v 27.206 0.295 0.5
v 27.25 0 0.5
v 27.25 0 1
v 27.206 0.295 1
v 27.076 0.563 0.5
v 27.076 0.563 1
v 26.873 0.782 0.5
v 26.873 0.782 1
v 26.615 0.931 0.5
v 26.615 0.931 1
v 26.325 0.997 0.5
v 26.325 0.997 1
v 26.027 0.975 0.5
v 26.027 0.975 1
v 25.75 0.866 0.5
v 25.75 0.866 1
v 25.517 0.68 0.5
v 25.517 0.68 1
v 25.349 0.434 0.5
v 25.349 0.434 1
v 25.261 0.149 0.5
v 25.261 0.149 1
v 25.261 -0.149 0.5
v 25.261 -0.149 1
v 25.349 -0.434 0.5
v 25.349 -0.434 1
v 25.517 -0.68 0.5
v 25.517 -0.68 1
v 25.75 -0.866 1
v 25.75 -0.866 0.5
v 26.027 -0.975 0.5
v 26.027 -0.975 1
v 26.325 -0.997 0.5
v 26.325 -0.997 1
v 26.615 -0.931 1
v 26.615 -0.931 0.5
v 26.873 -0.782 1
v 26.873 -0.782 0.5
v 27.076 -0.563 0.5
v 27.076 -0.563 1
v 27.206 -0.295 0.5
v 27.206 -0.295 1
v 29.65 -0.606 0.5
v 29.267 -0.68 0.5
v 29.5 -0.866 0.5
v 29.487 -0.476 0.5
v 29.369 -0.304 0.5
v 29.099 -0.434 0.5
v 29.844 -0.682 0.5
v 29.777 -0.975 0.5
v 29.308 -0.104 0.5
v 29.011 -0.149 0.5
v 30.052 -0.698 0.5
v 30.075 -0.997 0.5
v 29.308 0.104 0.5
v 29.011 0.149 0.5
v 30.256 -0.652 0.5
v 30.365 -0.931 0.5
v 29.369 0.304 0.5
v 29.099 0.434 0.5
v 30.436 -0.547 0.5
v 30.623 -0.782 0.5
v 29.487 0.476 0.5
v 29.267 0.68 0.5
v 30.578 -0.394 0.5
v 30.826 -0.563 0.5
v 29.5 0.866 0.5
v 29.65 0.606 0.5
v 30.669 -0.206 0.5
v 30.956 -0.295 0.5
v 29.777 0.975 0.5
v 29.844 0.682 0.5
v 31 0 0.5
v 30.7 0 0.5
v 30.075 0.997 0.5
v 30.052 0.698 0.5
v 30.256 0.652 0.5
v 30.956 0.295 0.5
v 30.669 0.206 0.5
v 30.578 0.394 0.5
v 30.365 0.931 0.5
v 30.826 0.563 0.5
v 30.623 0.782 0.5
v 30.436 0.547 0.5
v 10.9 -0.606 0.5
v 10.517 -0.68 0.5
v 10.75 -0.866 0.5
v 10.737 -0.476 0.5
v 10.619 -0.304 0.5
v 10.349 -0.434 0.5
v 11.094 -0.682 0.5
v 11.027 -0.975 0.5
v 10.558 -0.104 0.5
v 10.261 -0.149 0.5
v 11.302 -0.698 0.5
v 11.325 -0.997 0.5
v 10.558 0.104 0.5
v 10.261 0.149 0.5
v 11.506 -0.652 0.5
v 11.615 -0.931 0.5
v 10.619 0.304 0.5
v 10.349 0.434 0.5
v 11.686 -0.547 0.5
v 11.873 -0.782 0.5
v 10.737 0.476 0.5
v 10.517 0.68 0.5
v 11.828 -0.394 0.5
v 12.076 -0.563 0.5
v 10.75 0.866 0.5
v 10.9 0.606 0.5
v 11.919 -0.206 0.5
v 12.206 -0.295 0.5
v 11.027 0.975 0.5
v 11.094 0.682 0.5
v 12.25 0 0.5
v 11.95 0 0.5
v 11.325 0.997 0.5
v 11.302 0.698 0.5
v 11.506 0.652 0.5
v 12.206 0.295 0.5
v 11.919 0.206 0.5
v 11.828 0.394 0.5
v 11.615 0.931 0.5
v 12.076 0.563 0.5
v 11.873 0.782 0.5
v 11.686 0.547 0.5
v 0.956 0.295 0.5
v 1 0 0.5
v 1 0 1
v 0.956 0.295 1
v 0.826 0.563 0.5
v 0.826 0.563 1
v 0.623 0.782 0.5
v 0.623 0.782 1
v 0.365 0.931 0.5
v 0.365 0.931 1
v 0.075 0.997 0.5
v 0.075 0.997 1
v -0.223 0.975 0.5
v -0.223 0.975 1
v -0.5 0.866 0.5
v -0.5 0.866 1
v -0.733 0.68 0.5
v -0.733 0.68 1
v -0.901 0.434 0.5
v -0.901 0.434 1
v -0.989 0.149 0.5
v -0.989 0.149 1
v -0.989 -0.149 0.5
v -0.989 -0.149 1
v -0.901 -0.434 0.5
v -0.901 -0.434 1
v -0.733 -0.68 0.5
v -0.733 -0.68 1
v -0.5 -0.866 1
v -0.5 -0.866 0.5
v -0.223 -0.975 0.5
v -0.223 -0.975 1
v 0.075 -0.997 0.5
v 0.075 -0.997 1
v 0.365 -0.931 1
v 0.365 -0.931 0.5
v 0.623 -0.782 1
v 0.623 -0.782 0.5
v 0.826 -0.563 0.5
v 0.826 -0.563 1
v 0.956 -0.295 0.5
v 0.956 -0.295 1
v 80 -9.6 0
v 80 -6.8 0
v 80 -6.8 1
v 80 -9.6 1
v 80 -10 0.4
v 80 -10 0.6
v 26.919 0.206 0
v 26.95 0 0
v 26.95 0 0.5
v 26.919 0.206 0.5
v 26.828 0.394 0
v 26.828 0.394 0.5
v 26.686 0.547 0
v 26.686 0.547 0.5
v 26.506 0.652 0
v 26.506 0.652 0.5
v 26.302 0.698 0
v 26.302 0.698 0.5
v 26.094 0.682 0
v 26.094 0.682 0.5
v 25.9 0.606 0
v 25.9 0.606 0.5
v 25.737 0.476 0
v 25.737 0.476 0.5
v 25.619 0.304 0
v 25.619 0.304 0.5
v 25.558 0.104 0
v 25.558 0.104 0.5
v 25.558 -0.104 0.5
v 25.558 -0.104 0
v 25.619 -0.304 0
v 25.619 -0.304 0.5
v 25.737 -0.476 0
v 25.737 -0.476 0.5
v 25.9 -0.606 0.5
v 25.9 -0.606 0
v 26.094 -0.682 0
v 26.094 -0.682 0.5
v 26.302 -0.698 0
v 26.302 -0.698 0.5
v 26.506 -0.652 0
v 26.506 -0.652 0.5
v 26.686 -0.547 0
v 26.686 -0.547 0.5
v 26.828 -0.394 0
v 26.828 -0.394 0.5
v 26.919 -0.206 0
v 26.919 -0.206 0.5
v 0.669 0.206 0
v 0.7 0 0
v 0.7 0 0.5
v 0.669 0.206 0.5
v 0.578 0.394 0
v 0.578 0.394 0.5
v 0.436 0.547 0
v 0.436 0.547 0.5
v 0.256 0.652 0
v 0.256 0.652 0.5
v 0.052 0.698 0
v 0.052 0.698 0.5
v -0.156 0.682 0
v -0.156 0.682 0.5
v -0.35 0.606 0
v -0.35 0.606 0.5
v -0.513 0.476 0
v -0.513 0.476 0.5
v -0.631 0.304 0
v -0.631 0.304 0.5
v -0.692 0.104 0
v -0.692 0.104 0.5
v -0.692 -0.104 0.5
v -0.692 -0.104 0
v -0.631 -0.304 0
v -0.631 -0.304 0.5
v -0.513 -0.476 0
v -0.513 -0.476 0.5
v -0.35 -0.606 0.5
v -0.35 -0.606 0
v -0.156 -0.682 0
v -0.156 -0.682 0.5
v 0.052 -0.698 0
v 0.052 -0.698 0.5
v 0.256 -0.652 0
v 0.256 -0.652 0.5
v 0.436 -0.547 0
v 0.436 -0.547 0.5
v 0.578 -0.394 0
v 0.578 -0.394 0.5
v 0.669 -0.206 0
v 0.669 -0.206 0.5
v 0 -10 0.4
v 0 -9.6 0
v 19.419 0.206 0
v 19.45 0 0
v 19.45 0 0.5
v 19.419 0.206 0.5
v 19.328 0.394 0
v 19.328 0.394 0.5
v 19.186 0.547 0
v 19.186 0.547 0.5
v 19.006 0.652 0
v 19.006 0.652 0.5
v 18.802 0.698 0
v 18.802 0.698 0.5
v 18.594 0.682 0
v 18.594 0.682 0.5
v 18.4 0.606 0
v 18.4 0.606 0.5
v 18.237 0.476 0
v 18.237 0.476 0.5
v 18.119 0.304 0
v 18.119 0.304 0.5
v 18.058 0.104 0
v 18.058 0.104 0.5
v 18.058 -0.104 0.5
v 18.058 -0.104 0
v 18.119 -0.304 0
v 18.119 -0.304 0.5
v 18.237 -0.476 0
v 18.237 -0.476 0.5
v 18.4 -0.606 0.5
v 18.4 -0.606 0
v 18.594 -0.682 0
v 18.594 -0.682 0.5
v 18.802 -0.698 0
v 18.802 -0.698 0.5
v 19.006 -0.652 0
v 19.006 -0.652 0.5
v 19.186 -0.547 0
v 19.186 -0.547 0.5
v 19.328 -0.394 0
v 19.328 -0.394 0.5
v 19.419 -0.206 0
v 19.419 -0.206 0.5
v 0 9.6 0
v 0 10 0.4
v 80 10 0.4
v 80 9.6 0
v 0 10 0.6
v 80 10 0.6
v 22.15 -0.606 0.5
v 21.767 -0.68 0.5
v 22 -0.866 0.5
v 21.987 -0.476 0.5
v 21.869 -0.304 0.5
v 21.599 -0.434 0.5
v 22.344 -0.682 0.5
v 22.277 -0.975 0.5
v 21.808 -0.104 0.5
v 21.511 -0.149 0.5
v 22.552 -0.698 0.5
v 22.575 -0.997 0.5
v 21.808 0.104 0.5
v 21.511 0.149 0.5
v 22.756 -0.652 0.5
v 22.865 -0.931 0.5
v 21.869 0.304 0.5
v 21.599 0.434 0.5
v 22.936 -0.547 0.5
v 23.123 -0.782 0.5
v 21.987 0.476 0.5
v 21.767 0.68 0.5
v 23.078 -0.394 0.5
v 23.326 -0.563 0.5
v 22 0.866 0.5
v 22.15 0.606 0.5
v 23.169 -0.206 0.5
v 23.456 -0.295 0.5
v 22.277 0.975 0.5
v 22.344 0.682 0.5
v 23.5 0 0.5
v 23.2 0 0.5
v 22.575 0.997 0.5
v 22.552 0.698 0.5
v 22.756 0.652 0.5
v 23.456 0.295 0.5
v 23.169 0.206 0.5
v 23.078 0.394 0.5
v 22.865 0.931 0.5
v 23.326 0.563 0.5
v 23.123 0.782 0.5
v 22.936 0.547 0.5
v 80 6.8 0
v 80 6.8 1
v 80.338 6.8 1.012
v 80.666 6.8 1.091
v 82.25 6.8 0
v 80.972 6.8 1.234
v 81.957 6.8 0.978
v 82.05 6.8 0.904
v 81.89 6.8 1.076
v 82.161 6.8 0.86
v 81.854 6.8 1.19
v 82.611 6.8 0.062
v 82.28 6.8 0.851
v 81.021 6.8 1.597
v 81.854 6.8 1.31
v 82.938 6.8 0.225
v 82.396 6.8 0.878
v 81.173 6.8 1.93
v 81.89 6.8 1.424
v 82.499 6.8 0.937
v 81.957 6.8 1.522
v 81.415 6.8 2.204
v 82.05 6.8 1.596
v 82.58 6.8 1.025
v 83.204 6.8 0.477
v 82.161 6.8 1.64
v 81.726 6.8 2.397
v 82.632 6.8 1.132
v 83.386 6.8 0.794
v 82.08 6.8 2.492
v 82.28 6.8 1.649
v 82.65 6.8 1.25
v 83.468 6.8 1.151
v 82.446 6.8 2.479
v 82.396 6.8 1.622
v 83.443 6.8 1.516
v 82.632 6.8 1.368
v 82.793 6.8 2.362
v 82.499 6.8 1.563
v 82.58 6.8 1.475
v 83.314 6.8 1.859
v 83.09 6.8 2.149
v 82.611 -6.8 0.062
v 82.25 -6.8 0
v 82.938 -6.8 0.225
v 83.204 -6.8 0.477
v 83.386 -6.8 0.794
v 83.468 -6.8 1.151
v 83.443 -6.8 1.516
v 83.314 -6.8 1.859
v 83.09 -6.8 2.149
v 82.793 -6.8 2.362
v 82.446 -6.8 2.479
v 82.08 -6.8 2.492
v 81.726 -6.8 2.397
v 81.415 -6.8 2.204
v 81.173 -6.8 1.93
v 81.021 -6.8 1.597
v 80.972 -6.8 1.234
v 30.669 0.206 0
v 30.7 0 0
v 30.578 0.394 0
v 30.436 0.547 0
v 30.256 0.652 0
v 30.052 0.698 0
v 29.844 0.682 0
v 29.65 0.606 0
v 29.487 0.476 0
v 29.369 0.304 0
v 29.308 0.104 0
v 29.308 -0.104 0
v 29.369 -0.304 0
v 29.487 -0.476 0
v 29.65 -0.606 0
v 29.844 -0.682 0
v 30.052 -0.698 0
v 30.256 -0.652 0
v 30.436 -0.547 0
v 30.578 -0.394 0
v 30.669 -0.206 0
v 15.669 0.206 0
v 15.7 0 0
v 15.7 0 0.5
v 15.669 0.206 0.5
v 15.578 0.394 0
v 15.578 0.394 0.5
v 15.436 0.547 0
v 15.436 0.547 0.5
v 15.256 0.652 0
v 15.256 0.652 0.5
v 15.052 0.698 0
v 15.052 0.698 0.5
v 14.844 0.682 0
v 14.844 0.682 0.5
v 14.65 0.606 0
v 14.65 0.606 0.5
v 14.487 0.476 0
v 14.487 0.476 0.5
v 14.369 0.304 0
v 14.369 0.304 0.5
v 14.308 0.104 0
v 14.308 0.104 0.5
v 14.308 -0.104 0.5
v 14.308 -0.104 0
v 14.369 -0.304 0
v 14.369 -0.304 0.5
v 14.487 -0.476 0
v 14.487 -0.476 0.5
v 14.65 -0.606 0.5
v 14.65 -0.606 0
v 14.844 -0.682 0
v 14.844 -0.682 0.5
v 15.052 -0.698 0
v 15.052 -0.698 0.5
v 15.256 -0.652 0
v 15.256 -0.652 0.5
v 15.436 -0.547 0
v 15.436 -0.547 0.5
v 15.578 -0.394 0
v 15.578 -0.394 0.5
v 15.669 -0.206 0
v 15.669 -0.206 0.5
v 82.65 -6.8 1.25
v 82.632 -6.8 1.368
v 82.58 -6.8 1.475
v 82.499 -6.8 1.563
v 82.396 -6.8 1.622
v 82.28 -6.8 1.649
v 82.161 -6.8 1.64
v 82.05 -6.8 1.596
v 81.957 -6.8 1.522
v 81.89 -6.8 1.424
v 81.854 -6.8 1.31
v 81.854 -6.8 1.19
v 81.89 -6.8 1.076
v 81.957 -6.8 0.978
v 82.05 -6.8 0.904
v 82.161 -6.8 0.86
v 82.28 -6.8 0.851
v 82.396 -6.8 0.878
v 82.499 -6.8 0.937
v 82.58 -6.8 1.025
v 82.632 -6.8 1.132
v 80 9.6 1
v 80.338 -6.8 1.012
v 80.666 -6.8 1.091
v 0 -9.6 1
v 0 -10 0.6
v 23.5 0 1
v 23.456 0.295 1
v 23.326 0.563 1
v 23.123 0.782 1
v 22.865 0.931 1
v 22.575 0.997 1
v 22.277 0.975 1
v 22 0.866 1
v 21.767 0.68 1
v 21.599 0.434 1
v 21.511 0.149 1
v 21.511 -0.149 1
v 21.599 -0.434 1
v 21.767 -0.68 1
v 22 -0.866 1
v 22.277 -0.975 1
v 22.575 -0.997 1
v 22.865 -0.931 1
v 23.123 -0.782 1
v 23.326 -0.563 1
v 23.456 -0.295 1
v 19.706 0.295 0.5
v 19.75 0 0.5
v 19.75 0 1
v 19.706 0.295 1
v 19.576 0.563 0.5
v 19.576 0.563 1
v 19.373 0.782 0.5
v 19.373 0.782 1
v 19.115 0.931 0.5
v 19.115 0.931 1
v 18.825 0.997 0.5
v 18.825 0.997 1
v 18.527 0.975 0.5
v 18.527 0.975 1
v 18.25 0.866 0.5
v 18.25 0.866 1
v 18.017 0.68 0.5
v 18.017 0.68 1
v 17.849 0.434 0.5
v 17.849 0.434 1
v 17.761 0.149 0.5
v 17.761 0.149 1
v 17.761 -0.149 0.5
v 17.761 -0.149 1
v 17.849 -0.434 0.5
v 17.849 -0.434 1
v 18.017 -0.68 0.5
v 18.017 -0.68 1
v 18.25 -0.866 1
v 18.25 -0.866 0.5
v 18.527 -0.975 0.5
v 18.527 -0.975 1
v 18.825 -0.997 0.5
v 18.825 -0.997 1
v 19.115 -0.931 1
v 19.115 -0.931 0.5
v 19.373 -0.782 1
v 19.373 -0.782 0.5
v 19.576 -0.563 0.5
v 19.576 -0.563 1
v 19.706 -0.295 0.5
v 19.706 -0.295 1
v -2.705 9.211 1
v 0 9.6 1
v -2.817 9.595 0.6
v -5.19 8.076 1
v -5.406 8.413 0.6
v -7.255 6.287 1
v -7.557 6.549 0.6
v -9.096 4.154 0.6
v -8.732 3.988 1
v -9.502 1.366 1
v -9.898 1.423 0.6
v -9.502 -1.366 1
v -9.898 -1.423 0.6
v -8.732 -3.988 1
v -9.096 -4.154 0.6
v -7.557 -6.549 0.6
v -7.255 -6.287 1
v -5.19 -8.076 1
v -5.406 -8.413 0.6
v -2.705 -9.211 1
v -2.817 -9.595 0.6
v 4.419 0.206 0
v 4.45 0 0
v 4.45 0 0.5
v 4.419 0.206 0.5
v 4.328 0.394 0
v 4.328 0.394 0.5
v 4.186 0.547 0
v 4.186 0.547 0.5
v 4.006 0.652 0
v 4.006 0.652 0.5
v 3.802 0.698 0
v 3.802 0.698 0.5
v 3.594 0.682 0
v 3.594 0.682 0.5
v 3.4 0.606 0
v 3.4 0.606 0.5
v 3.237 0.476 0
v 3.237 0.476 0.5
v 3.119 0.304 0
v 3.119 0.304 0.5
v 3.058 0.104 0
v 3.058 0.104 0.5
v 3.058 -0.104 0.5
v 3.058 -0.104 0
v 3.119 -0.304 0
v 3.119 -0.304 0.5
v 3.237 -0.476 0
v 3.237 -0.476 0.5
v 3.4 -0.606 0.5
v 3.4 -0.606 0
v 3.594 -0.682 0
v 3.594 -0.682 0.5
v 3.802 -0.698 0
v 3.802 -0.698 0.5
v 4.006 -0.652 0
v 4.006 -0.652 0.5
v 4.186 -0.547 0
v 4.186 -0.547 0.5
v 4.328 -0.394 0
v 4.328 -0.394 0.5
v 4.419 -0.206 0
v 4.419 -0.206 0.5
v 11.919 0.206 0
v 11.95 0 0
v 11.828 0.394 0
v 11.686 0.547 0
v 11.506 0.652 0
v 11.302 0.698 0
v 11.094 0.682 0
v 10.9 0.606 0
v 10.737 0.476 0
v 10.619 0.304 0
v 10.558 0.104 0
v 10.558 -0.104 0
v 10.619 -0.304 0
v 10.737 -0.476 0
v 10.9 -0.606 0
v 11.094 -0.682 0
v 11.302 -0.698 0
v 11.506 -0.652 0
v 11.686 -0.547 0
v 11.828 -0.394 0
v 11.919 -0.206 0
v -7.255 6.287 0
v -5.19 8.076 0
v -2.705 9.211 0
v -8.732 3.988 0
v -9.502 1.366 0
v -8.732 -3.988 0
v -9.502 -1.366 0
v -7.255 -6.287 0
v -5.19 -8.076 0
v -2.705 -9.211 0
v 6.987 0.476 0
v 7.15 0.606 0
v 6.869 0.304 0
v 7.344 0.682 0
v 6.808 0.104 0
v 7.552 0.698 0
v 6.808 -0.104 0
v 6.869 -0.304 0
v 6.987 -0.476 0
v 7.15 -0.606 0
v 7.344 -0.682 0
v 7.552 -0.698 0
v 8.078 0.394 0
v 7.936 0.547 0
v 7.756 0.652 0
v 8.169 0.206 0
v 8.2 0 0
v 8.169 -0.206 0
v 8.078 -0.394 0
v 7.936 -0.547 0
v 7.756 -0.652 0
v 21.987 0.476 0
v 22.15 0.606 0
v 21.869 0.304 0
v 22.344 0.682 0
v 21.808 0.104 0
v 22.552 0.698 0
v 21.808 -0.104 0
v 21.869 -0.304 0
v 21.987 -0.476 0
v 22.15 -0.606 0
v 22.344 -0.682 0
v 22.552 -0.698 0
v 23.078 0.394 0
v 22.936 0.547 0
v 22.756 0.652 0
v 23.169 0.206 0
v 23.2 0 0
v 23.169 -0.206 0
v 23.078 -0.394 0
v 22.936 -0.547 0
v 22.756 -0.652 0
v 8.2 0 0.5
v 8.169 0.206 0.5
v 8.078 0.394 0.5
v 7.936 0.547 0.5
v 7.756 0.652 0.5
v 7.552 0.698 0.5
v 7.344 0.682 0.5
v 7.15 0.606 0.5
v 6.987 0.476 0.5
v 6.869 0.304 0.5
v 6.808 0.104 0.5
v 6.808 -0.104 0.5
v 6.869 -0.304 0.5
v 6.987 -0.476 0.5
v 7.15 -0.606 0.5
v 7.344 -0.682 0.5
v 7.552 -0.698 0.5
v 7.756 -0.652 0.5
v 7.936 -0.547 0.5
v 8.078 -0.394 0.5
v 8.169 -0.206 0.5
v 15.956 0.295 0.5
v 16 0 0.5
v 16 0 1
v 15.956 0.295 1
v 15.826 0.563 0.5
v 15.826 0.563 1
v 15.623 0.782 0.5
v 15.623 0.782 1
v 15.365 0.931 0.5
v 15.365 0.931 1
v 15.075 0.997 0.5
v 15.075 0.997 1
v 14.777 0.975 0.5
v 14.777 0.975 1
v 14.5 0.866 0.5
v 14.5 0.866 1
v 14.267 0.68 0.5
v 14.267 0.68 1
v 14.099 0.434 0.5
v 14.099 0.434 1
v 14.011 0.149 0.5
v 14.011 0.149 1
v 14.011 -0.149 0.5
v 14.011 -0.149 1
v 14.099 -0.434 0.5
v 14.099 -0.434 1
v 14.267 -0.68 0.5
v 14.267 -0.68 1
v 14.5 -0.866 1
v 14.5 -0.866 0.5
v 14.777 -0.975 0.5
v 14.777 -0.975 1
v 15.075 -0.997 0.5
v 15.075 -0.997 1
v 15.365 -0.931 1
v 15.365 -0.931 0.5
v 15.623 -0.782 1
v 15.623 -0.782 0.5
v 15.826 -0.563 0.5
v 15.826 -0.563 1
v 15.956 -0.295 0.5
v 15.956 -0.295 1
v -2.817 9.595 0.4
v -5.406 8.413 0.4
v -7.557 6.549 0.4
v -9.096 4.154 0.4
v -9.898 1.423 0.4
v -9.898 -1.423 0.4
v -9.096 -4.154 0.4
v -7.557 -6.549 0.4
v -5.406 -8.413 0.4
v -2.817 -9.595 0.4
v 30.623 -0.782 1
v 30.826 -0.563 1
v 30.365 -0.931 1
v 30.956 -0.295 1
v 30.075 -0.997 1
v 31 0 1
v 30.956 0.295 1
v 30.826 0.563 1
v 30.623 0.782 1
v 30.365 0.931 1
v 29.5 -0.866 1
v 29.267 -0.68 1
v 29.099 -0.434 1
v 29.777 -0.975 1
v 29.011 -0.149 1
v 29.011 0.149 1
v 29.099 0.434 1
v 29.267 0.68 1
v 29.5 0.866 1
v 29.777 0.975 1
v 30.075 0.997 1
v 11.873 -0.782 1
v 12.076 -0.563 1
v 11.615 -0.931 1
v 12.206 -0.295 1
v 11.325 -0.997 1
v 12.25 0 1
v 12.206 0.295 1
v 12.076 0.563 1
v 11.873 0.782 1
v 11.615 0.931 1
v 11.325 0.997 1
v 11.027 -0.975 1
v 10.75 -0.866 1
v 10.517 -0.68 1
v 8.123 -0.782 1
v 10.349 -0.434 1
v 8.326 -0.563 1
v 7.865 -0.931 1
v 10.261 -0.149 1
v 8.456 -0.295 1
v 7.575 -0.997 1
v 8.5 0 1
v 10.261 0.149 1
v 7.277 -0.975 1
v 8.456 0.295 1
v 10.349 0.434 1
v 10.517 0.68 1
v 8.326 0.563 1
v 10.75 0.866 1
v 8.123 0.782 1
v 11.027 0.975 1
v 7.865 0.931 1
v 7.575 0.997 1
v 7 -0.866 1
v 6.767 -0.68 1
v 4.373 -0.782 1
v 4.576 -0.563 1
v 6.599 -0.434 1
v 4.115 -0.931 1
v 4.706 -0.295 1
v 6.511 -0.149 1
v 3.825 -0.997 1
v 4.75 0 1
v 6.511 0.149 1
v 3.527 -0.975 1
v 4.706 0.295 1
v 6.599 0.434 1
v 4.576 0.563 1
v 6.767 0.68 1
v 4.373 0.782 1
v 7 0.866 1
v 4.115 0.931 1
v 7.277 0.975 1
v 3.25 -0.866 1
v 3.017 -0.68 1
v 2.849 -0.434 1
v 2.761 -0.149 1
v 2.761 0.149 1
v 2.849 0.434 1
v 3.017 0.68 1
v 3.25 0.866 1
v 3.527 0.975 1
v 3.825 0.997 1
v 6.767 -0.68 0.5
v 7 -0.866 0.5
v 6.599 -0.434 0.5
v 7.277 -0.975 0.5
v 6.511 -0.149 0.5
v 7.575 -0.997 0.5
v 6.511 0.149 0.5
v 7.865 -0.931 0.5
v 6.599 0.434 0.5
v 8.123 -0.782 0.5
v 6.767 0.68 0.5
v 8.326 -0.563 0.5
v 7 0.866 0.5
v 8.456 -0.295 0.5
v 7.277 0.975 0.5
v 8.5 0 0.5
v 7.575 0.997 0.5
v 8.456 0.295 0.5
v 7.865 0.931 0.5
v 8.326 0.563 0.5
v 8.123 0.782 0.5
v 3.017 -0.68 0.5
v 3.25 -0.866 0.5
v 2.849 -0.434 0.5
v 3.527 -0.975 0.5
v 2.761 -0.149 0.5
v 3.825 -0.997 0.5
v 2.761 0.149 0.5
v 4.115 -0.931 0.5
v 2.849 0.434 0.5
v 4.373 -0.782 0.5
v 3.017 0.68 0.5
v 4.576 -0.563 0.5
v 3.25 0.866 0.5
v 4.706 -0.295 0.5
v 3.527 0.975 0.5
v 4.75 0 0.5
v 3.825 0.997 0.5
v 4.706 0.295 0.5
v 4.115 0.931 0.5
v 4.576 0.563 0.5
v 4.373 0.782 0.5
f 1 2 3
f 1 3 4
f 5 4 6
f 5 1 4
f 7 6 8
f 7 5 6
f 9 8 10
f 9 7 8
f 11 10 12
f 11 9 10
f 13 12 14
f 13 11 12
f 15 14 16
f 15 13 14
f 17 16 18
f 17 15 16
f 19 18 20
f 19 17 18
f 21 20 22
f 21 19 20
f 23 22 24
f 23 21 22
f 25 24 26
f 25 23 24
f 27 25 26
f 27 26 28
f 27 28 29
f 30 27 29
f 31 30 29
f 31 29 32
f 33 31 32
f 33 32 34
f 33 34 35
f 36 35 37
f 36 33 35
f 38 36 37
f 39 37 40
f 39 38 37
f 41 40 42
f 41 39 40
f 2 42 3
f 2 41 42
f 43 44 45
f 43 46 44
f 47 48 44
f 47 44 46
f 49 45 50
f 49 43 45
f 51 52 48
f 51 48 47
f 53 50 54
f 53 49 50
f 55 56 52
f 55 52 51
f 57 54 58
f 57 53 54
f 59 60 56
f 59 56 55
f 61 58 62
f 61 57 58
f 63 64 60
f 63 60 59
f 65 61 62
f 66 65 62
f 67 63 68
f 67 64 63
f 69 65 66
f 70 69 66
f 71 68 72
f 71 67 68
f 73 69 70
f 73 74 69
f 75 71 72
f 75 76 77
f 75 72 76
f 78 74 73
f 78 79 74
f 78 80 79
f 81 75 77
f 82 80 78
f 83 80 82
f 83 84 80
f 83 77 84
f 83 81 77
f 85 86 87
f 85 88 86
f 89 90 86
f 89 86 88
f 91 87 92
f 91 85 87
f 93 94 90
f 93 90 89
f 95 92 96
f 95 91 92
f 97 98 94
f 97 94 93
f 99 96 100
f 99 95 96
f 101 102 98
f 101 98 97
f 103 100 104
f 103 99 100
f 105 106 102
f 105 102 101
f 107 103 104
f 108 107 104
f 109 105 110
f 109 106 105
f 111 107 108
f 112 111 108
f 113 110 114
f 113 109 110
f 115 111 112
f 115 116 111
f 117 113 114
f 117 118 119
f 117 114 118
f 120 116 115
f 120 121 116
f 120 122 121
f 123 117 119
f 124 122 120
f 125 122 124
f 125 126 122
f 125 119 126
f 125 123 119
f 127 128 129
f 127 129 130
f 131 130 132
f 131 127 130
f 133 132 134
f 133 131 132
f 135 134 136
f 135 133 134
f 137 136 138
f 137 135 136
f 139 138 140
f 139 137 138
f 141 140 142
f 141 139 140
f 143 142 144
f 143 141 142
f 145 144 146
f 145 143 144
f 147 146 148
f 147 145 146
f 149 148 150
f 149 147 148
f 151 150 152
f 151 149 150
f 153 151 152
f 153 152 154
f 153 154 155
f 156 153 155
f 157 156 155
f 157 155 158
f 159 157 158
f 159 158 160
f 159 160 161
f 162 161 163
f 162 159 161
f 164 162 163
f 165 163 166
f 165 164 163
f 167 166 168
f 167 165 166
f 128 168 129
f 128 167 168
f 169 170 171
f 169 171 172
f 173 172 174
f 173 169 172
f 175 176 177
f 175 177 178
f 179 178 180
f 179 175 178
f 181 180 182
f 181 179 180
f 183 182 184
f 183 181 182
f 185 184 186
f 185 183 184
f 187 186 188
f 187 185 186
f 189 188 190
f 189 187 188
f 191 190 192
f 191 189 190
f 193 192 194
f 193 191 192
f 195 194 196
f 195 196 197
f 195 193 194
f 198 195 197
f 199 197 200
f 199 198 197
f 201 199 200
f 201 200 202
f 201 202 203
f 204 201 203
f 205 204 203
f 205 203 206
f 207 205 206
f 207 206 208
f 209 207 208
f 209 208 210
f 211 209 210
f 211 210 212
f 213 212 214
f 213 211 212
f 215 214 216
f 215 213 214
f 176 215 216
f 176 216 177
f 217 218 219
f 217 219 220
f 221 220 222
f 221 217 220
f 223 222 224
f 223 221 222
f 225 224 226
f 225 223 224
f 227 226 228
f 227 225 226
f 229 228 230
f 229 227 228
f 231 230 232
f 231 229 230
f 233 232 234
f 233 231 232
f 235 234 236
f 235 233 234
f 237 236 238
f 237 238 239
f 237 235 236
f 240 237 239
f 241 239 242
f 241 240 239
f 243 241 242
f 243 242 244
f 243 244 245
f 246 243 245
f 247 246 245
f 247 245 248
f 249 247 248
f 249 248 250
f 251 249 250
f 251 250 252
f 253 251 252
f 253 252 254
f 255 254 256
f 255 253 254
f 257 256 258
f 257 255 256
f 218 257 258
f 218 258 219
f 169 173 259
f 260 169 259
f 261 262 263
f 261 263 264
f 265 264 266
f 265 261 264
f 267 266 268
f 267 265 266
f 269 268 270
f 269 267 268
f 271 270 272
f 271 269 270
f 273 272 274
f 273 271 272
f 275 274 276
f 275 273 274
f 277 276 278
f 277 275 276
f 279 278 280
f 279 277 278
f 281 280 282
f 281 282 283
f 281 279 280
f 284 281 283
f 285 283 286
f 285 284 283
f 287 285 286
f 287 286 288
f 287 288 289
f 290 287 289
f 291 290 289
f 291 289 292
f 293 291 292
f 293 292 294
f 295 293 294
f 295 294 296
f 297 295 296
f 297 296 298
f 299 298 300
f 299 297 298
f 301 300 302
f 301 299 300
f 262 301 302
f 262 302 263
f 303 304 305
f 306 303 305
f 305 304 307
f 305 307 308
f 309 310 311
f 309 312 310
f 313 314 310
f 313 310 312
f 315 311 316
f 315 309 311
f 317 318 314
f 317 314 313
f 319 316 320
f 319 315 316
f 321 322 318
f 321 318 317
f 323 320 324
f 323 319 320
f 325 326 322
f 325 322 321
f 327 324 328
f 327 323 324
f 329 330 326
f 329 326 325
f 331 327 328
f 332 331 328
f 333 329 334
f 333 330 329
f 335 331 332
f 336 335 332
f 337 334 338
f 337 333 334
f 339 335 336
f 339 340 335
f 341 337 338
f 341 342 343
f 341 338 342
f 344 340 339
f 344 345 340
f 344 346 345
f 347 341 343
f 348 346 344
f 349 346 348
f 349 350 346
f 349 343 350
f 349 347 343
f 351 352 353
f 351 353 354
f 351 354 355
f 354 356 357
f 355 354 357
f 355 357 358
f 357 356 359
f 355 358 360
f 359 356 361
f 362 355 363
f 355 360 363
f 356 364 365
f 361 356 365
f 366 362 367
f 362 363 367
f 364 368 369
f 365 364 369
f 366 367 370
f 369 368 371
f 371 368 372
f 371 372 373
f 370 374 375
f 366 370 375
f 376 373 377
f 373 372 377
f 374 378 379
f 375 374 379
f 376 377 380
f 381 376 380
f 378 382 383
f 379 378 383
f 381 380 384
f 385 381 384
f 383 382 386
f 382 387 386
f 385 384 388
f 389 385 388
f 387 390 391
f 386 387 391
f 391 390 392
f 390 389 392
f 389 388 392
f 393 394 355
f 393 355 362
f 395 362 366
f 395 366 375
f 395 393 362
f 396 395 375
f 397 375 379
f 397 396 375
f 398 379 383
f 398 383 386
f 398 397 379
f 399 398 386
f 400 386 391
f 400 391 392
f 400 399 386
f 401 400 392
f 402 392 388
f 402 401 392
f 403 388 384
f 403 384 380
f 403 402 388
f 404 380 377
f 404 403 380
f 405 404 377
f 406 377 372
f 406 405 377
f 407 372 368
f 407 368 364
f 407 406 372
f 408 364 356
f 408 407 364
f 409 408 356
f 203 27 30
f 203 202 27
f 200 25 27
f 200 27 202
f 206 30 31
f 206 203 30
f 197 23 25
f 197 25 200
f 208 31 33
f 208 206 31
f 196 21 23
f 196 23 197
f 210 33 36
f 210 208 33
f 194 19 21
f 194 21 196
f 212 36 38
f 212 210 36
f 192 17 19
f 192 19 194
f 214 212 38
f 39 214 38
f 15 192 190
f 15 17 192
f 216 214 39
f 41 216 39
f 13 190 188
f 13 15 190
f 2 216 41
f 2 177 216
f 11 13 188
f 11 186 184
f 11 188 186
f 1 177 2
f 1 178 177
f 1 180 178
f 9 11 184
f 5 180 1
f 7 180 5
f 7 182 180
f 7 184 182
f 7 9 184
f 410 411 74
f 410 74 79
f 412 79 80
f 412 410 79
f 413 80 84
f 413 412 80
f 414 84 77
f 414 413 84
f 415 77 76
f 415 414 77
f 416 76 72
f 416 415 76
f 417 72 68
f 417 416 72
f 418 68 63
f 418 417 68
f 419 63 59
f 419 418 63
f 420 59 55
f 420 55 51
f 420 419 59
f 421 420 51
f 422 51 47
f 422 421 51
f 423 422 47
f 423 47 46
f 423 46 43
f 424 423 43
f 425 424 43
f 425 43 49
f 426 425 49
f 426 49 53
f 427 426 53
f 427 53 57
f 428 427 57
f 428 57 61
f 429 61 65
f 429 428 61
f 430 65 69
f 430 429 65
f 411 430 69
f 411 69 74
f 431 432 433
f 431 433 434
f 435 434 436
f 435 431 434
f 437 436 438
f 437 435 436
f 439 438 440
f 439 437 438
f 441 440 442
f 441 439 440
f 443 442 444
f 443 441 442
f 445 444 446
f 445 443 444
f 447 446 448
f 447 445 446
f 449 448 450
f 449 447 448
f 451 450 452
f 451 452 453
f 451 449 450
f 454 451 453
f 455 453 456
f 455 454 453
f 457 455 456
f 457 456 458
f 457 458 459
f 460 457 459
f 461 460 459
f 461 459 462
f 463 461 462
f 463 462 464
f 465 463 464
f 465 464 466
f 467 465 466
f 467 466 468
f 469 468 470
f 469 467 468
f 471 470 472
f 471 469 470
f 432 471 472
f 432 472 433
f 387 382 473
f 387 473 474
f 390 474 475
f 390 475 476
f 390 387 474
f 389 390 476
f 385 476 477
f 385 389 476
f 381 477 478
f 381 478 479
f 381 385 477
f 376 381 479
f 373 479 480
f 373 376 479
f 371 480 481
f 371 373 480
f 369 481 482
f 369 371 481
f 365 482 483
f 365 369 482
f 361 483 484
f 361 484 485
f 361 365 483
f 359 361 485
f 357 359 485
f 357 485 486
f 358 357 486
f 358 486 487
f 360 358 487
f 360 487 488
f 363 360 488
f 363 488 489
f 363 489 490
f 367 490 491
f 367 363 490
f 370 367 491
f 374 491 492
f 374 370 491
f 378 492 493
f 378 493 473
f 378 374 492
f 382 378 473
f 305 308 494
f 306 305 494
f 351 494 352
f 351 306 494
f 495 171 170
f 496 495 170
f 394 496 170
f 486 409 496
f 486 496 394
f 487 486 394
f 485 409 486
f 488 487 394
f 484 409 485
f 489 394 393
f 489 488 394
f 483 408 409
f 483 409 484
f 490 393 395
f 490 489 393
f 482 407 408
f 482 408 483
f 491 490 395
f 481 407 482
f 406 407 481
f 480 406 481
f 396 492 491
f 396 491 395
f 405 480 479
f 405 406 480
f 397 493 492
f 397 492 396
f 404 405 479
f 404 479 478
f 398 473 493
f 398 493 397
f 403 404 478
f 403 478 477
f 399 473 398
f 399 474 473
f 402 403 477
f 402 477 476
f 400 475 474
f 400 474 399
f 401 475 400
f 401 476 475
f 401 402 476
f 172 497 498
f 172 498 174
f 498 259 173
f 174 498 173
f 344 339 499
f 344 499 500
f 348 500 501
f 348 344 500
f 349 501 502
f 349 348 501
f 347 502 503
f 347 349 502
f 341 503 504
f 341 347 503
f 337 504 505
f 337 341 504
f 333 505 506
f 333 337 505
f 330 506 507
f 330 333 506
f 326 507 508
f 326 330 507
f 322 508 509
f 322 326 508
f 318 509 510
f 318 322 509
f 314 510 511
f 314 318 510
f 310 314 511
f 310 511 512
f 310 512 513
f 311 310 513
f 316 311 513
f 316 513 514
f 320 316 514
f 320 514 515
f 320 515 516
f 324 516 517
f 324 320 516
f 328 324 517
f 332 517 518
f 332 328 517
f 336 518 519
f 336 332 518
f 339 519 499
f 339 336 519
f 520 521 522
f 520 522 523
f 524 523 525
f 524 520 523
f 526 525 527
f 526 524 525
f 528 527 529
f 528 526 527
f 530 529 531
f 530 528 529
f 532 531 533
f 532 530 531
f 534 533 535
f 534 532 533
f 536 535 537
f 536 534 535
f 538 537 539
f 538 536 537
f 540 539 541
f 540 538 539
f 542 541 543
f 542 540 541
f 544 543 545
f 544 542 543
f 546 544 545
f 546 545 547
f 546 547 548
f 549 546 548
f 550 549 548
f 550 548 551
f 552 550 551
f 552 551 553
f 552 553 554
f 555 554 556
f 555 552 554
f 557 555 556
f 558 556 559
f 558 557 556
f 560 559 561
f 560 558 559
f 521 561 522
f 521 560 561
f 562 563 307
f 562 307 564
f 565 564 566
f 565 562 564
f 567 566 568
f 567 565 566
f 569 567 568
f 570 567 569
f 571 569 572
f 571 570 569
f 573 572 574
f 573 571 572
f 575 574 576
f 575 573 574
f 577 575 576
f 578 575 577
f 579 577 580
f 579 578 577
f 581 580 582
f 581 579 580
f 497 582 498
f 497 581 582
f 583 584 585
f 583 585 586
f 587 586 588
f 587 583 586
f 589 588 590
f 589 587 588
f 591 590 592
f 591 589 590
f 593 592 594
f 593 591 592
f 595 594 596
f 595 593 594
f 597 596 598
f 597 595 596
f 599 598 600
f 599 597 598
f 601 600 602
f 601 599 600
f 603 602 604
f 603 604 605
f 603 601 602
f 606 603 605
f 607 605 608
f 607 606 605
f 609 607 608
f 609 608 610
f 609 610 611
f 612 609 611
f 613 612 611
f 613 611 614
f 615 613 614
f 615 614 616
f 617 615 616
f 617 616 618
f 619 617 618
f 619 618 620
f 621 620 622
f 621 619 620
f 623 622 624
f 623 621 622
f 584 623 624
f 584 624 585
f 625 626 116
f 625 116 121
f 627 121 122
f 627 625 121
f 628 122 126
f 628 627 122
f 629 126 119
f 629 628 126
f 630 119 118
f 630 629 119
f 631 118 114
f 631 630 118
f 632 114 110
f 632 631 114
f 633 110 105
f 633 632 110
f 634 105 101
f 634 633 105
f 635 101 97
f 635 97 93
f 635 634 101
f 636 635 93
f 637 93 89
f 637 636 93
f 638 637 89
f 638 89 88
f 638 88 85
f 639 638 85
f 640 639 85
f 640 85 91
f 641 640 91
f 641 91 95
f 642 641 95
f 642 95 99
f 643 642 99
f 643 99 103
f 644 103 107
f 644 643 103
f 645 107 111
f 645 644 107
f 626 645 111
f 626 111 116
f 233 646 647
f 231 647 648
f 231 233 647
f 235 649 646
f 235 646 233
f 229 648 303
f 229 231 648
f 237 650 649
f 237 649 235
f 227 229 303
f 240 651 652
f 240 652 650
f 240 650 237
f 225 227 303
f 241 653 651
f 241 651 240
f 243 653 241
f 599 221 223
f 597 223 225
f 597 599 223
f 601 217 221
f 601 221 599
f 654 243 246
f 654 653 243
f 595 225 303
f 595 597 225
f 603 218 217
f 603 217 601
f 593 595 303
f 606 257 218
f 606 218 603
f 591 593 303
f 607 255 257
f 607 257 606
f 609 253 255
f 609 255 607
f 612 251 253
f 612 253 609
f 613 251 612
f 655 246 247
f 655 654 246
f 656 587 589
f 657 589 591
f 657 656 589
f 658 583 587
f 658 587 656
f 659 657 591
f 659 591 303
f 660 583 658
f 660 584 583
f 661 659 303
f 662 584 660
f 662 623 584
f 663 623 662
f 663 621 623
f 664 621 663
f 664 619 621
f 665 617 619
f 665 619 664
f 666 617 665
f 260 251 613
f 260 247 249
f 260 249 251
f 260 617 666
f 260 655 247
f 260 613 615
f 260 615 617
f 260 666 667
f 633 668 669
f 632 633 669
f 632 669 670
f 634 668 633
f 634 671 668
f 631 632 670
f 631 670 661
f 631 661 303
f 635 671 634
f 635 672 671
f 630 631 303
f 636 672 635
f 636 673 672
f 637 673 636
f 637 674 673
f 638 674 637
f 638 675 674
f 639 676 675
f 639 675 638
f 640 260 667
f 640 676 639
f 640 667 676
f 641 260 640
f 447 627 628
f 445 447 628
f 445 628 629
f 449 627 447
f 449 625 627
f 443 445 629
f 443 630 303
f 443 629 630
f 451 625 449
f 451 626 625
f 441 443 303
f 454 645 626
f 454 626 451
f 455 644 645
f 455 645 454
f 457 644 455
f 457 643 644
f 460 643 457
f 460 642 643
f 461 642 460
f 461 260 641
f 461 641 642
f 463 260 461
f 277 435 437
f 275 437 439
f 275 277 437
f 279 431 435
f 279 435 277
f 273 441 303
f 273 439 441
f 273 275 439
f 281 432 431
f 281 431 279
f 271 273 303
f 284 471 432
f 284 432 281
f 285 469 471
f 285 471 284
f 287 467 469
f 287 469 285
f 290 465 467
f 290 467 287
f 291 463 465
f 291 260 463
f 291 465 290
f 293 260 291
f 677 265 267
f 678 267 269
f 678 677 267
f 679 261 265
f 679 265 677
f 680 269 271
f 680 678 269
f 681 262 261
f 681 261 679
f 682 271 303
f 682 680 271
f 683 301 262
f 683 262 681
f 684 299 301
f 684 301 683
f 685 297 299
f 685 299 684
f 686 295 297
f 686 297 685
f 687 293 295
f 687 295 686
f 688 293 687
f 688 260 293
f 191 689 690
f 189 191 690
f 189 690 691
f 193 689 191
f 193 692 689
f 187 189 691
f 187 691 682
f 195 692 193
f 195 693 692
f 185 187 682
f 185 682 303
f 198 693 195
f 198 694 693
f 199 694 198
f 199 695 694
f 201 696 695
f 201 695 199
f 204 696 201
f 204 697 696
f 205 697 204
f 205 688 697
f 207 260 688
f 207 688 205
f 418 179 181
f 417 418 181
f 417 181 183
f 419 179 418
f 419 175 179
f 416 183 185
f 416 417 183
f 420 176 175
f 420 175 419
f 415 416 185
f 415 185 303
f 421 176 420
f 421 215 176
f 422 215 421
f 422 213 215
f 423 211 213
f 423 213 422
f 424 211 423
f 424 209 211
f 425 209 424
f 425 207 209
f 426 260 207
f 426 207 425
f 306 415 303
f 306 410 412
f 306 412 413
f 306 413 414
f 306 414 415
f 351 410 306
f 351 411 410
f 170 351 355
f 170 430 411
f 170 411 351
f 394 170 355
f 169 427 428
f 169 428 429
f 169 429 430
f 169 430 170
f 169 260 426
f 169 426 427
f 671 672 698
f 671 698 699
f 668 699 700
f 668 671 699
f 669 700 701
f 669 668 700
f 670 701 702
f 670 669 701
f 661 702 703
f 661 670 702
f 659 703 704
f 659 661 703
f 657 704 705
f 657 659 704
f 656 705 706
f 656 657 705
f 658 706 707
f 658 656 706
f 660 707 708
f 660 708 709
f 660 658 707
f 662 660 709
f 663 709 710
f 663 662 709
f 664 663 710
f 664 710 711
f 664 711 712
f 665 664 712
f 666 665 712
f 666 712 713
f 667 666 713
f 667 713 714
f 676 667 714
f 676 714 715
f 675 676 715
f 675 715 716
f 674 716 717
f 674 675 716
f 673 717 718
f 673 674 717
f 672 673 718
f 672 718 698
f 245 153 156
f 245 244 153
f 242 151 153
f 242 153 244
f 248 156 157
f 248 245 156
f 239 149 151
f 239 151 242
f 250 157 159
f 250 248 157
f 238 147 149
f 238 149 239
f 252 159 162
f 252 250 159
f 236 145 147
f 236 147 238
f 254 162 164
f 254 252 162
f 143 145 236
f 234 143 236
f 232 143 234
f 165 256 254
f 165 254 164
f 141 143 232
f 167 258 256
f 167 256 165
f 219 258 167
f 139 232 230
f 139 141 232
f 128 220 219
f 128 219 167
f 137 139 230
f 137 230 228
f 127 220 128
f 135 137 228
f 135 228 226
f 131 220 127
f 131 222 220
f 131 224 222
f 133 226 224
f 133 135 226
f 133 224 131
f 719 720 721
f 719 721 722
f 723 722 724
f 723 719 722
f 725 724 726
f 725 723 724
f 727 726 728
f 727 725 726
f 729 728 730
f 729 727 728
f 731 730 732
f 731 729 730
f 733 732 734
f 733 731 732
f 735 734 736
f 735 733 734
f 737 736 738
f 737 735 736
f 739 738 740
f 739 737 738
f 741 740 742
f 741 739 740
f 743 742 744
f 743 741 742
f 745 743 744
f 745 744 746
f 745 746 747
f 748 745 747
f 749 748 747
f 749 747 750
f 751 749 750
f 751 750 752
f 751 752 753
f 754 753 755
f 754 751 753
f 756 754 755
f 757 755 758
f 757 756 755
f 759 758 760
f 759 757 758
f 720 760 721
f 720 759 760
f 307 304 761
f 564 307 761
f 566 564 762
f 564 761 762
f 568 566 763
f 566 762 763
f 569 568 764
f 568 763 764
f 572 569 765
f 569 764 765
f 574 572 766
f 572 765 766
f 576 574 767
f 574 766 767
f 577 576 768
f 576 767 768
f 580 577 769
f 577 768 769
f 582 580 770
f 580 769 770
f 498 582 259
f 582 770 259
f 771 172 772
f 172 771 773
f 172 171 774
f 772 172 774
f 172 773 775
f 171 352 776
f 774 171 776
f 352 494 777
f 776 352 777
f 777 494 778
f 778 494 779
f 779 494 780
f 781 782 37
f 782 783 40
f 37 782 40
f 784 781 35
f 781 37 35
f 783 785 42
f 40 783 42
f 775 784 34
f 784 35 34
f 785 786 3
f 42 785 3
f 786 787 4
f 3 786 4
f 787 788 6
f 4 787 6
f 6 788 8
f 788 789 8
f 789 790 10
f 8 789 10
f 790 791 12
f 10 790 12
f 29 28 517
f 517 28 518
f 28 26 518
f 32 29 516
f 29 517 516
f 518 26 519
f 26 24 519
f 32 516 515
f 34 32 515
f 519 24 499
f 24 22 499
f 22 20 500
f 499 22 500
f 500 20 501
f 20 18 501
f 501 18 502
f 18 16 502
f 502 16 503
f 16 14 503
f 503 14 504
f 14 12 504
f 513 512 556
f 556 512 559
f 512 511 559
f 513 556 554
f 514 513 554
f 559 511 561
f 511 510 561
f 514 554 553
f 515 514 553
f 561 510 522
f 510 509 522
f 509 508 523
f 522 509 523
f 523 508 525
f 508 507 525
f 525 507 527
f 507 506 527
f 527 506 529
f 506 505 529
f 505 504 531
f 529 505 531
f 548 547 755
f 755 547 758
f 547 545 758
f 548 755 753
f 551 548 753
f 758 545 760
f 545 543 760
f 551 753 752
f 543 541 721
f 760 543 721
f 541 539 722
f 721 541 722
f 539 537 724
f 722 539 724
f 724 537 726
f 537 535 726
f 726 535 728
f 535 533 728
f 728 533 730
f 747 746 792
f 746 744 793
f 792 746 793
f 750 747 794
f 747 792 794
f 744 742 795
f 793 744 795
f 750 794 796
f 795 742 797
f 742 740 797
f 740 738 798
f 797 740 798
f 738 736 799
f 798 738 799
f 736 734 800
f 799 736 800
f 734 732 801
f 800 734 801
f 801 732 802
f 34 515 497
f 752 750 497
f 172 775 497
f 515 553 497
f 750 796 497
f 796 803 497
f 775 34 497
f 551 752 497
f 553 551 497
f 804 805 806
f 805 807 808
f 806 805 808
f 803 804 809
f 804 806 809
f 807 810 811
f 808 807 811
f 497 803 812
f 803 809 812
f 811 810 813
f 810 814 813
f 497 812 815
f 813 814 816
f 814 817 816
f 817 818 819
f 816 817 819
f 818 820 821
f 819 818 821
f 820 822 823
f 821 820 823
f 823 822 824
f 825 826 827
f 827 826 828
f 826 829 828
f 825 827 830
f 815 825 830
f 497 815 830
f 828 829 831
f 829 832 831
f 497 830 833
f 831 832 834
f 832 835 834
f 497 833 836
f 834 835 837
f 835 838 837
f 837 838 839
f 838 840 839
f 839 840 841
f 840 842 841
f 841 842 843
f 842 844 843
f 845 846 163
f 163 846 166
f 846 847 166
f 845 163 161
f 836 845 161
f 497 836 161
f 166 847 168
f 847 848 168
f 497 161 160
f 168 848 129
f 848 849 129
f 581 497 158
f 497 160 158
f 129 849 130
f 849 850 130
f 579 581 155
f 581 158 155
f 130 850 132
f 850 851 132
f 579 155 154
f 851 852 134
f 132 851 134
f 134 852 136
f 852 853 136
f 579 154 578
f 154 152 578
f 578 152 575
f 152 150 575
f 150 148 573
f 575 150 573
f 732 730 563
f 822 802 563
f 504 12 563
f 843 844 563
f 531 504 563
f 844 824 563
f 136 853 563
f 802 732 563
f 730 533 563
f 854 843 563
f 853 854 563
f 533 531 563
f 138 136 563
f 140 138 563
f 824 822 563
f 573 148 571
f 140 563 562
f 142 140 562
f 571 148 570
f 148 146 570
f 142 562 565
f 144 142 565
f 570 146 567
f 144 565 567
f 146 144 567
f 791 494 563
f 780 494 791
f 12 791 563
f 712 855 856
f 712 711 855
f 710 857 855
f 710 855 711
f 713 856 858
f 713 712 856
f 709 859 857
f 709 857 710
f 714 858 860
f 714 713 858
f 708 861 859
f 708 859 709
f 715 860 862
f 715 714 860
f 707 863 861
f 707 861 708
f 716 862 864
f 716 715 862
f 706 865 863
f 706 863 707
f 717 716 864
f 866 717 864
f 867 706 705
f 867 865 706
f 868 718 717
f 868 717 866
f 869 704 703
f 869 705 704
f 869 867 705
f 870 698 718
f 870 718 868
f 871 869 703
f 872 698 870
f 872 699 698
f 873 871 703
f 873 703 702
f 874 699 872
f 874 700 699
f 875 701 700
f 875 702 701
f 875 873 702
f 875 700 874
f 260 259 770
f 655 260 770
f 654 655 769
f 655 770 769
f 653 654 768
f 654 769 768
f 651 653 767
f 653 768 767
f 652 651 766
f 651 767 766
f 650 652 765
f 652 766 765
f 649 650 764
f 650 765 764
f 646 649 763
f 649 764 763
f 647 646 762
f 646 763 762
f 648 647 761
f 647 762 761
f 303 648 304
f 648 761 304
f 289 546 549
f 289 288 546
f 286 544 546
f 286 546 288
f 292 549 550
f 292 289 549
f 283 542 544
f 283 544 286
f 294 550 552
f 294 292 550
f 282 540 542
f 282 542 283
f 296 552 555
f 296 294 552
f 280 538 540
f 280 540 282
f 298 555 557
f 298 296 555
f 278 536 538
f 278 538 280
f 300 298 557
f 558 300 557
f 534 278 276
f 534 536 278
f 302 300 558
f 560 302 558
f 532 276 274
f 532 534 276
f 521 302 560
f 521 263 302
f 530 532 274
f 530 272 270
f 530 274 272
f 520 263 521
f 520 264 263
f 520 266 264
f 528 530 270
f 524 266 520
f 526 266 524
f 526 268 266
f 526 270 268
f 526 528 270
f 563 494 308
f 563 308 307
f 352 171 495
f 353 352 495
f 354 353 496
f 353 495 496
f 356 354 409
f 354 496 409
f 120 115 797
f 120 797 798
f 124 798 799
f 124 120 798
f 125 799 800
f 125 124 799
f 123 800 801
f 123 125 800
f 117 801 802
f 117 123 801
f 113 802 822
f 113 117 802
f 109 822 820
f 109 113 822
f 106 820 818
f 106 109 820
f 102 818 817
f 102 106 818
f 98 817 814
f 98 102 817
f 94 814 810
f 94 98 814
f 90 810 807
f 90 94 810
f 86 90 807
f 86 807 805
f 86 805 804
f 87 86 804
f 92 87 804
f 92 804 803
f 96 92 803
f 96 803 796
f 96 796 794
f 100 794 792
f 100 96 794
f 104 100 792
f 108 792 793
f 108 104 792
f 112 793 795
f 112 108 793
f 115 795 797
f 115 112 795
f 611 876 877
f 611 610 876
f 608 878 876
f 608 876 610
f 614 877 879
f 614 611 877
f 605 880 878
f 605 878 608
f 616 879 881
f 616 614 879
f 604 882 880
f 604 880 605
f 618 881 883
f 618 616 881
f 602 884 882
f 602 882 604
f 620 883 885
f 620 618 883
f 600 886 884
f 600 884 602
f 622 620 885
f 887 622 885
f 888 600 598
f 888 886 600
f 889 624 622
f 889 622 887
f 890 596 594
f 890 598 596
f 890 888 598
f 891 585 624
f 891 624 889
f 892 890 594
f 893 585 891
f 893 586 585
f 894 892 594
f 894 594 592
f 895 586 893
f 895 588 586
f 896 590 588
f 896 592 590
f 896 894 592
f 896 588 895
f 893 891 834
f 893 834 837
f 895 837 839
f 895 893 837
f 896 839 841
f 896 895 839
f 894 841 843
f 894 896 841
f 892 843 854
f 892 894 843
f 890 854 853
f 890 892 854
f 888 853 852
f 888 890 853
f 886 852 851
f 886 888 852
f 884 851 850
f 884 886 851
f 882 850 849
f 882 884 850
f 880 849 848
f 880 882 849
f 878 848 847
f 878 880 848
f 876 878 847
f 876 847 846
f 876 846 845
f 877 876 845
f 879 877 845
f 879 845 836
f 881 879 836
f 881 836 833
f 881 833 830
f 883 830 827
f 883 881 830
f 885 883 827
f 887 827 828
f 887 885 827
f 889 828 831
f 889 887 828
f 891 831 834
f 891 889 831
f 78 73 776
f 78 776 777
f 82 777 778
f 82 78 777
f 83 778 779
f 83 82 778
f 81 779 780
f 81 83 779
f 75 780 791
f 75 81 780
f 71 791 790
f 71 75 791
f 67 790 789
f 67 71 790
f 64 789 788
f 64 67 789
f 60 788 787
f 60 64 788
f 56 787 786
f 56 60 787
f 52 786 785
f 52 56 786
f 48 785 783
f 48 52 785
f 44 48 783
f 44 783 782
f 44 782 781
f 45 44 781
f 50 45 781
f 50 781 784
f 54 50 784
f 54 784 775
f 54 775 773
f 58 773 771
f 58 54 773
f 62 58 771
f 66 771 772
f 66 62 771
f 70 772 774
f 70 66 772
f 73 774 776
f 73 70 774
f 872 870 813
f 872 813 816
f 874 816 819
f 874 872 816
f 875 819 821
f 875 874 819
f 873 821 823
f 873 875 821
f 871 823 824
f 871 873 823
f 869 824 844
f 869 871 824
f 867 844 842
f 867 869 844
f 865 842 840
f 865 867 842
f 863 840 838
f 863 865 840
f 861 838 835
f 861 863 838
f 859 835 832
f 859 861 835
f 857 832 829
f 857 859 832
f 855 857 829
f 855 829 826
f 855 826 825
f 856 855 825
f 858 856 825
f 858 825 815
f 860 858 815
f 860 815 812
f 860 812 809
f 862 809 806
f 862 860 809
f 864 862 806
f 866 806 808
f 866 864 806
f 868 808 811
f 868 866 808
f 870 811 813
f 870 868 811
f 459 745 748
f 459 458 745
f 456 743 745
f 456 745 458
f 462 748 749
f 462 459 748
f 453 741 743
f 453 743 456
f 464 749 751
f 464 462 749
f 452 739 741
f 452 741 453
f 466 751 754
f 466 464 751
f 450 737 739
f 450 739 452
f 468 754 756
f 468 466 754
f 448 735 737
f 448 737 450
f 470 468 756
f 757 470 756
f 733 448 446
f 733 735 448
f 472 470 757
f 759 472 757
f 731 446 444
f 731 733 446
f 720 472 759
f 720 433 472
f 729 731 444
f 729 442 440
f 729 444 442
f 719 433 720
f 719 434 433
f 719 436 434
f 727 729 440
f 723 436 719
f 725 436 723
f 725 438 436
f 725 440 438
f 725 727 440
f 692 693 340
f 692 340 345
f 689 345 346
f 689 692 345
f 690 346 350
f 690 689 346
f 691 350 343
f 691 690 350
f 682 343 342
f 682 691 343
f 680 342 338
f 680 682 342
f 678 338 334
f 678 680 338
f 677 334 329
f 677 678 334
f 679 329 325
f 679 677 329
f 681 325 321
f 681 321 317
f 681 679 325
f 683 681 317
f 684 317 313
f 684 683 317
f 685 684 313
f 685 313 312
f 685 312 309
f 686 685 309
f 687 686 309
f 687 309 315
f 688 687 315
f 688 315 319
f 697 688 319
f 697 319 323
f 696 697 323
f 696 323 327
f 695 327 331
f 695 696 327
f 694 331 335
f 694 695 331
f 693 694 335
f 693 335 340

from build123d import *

# Parameters (mm, degrees)
PAD_DEPTH              = 1
PAD001_DEPTH           = 6.8
PAD001_DEPTH_BACK      = 6.8
CYLINDER_R             = 0.4
CYLINDER_DEPTH         = 13.6
CYLINDER001_R          = 1
CYLINDER001_DEPTH      = 0.5
LINEARPATTERN_COUNT    = 9
LINEARPATTERN_PITCH    = 3.75
CYLINDER002_R          = 0.7
CYLINDER002_DEPTH      = 0.5
LINEARPATTERN001_COUNT = 9
LINEARPATTERN001_PITCH = 3.75
CHAMFER_SIZE           = 0.4


with BuildPart() as part:
    # Sketch → Pad (new body)
    with BuildSketch(Plane.XY):
        with BuildLine():
            Line((0, 10), (80, 10))
            Line((80, 10), (80, -10))
            Line((0, -10), (80, -10))
            ThreePointArc((0, 10), (-10, 0), (0, -10))
        make_face()
    extrude(amount=PAD_DEPTH)

    # Sketch002 (on Sketch) → Pad001 (join, two sides)
    with BuildSketch(Plane.XZ) as pad001_sk:
        with BuildLine():
            Line((80, 0), (82.25, 0))
            ThreePointArc((82.25, 0), (83.090481, 2.14888), (80.972274, 1.233843))
            ThreePointArc((80, 1), (80.503859, 1.043236), (80.972274, 1.233843))
            Line((80, 1), (80, 0))
        make_face()
    extrude(amount=PAD001_DEPTH)
    extrude(pad001_sk.sketch, amount=-PAD001_DEPTH_BACK)

    # Cylinder → Cylinder (cut)
    with BuildSketch(Plane(origin=(82.25, 6.8, 1.25), x_dir=(1, 0, 0), z_dir=(0, -1, 0))):
        Circle(CYLINDER_R)
    extrude(amount=CYLINDER_DEPTH, mode=Mode.SUBTRACT)

    # Cylinder001 → Cylinder001 (cut)
    with BuildSketch(Plane.XY.offset(0.5)):
        Circle(CYLINDER001_R)
    cylinder001 = extrude(amount=CYLINDER001_DEPTH, mode=Mode.SUBTRACT)

    # LinearPattern: Cylinder001 ×9
    with Locations(*[(i * LINEARPATTERN_PITCH, 0, 0) for i in range(1, LINEARPATTERN_COUNT)]):
        add(cylinder001, mode=Mode.SUBTRACT)

    # Cylinder002 → Cylinder002 (cut)
    with BuildSketch(Plane.XY):
        Circle(CYLINDER002_R)
    cylinder002 = extrude(amount=CYLINDER002_DEPTH, mode=Mode.SUBTRACT)

    # LinearPattern001: Cylinder002 ×9
    with Locations(*[(i * LINEARPATTERN001_PITCH, 0, 0) for i in range(1, LINEARPATTERN001_COUNT)]):
        add(cylinder002, mode=Mode.SUBTRACT)

    # Chamfer
    chamfer_edges = [part.edges().sort_by_distance(p)[0] for p in [
        (40, -10, 1),
        (40, 10, 1),
        (-10, 0, 1),
        (40, 10, 0),
        (40, -10, 0),
        (-10, 0, 0),
    ]]
    chamfer(chamfer_edges, length=CHAMFER_SIZE)


solid = part.part
